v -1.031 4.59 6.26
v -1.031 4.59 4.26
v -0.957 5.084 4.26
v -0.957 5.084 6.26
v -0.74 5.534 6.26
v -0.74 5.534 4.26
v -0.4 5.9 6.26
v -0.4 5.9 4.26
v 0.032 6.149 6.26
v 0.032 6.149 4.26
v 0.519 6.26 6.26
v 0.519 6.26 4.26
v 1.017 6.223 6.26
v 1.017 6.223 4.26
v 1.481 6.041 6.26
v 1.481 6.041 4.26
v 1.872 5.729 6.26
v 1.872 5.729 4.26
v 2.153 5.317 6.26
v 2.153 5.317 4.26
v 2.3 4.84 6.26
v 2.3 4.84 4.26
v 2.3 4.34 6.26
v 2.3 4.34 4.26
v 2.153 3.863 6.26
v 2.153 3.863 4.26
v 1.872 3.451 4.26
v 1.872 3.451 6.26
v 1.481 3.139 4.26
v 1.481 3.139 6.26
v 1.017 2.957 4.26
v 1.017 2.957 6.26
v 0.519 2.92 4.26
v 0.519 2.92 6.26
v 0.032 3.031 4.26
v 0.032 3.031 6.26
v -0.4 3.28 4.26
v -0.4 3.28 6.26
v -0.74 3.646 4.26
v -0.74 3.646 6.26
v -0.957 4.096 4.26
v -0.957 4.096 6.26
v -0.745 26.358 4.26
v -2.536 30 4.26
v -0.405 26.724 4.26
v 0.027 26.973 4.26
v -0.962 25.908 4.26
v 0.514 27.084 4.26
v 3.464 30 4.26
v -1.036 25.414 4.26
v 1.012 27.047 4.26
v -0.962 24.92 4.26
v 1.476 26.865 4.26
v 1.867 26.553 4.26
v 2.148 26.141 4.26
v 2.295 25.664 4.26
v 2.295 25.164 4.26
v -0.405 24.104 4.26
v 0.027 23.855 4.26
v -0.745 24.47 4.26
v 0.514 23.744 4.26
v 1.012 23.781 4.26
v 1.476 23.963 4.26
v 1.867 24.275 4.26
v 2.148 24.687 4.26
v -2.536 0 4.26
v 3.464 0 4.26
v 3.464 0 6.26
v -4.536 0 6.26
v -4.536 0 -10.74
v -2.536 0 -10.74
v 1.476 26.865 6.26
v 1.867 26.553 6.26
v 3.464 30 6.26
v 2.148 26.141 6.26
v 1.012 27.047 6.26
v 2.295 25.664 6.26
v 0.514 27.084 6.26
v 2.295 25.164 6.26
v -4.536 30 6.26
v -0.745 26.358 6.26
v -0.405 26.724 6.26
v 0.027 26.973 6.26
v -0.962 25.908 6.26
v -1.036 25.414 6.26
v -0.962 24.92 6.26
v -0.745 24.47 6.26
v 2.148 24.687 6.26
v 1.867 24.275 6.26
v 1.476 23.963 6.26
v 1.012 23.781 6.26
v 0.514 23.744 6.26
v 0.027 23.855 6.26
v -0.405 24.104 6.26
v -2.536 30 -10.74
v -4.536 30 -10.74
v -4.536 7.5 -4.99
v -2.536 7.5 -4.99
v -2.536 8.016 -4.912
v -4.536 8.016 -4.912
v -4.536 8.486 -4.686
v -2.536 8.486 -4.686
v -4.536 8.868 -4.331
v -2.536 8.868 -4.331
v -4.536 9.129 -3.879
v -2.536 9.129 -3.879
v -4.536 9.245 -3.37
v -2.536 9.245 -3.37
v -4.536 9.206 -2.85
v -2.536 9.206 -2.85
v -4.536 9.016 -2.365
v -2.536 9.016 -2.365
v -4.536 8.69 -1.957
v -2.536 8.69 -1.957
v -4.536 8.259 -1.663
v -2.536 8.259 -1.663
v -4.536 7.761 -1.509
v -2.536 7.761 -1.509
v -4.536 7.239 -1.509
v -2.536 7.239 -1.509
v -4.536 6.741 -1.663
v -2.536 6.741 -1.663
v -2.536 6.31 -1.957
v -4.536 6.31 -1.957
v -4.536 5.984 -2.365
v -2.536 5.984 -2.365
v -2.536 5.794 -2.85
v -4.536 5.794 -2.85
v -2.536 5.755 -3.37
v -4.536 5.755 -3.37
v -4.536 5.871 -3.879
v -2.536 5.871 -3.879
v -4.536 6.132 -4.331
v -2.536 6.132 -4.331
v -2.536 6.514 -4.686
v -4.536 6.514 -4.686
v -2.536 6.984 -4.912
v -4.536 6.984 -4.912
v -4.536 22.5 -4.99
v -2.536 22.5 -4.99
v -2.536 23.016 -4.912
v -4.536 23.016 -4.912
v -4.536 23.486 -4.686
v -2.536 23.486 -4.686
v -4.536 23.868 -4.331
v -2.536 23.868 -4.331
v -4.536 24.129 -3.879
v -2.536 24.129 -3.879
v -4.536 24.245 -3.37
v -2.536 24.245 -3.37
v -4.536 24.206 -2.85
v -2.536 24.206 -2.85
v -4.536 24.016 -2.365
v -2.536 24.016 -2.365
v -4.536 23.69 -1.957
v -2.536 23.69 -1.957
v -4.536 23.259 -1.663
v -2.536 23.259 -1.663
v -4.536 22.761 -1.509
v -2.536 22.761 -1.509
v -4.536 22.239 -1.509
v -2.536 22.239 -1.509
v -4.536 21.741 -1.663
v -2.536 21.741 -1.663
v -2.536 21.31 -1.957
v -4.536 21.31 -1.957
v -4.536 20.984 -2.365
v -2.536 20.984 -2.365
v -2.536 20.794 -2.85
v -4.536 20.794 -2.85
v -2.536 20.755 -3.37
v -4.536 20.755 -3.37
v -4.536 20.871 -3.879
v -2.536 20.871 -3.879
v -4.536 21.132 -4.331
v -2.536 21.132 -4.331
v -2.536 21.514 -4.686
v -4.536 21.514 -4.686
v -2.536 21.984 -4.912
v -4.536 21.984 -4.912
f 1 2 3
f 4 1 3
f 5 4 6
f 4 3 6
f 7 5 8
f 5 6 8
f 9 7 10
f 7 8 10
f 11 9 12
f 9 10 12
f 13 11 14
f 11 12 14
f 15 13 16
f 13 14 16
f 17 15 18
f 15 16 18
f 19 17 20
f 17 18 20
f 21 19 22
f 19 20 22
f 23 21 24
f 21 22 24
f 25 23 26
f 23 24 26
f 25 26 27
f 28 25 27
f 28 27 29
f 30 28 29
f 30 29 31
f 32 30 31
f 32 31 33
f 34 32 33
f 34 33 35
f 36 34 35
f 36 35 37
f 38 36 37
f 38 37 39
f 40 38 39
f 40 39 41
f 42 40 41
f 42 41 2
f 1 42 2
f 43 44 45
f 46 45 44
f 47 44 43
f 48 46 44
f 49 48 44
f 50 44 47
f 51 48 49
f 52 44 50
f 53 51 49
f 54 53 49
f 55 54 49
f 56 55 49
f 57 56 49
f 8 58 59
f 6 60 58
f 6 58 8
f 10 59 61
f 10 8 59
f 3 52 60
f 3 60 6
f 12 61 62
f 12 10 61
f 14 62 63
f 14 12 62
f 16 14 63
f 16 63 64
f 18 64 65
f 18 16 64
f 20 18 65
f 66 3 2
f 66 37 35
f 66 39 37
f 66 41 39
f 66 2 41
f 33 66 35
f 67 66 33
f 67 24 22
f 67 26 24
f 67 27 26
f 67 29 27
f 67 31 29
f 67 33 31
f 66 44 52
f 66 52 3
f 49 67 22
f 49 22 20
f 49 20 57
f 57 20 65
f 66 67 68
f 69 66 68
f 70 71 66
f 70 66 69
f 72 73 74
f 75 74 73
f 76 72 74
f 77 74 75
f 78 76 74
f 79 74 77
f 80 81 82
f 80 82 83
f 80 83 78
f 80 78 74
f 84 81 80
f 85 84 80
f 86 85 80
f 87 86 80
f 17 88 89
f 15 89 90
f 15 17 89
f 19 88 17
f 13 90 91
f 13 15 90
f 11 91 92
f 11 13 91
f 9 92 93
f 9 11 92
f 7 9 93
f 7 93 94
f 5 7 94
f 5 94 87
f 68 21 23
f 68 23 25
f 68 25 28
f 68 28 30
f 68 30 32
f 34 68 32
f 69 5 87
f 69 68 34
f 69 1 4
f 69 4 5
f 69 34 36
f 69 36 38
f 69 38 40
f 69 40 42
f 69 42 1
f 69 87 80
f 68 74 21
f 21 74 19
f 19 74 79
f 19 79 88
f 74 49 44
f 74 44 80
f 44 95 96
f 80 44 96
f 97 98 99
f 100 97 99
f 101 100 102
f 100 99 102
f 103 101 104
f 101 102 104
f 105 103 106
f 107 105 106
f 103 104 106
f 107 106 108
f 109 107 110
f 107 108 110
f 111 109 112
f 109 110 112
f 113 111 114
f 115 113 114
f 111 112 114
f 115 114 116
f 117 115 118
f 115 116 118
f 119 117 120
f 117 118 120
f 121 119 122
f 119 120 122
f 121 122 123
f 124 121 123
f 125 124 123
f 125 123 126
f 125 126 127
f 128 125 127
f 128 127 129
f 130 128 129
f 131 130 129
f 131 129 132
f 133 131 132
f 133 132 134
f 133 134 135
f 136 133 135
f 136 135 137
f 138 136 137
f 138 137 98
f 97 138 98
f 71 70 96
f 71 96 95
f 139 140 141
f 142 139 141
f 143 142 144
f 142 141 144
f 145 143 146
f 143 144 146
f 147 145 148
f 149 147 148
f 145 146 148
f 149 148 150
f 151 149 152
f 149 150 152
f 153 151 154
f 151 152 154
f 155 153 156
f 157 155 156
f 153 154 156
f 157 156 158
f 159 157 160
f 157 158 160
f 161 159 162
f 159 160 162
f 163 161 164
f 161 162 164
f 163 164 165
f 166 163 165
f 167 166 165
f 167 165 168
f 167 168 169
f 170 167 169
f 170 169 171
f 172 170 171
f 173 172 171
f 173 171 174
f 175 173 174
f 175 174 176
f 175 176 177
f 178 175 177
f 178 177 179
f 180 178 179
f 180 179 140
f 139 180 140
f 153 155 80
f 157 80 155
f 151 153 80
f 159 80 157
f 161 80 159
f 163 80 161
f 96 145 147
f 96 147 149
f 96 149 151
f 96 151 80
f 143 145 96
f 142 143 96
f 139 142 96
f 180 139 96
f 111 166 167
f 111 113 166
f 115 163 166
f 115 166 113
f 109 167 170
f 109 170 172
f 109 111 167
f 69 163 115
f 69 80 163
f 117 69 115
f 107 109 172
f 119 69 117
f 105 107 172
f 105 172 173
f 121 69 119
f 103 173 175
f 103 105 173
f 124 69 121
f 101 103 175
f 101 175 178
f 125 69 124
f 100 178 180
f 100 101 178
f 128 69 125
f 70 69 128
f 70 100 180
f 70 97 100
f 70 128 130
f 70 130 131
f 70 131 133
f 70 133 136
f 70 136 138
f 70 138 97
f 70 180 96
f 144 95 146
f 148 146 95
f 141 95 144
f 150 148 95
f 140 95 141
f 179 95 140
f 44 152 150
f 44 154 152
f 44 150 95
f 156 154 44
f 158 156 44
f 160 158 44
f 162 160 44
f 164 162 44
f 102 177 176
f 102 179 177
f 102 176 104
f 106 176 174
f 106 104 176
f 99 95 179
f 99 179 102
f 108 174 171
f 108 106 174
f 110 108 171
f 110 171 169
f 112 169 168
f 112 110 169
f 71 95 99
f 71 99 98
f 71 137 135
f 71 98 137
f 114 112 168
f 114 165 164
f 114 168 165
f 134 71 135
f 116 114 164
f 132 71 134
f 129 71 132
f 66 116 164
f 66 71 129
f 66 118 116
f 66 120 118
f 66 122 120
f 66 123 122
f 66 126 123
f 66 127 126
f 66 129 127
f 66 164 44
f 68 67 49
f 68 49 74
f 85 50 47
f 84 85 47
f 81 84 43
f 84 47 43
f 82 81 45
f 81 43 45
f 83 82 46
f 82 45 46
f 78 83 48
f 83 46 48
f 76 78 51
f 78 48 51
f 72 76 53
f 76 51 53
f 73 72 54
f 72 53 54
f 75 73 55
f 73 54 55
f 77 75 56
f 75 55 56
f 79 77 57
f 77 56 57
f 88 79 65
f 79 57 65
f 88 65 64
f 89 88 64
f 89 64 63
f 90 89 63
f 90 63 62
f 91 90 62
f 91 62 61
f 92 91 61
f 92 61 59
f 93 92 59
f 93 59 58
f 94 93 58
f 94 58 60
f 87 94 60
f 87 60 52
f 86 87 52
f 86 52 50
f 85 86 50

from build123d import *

# Parameters (mm, degrees)
BOSS_EXTRUDE1_DEPTH = 30
SKETCH2_R           = 1.675
CUT_EXTRUDE1_DEPTH  = 30
SKETCH3_R           = 1.75
CUT_EXTRUDE2_DEPTH  = 30


with BuildPart() as part:
    # Sketch1 → Boss-Extrude1 (new body)
    with BuildSketch(Plane(origin=(0, 0, 0), x_dir=(1, 0, 0), z_dir=(0, 1, 0))):
        Polygon((-2.53610988, 10.739698715), (-2.53610988, -4.260301285), (3.46389012, -4.260301285), (3.46389012, -6.260301285), (-4.53610988, -6.260301285), (-4.53610988, 10.739698715), align=None)
    extrude(amount=BOSS_EXTRUDE1_DEPTH)

    # Sketch2 → Cut-Extrude1 (cut)
    with BuildSketch(Plane(origin=(0, 0, 4.260301285), x_dir=(-1, 0, 0), z_dir=(0, 0, -1))):
        with Locations((-0.63889012, 25.414)):
            Circle(SKETCH2_R)
        with Locations((-0.64389012, 4.59)):
            Circle(SKETCH2_R)
    extrude(amount=-CUT_EXTRUDE1_DEPTH, mode=Mode.SUBTRACT)

    # Sketch3 → Cut-Extrude2 (cut)
    with BuildSketch(Plane(origin=(-2.53610988, 0, 0), x_dir=(0, 0, -1), z_dir=(1, 0, 0))):
        with Locations((3.239698715, 22.5)):
            Circle(SKETCH3_R)
        with Locations((3.239698715, 7.5)):
            Circle(SKETCH3_R)
    extrude(amount=-CUT_EXTRUDE2_DEPTH, mode=Mode.SUBTRACT)


solid = part.part
